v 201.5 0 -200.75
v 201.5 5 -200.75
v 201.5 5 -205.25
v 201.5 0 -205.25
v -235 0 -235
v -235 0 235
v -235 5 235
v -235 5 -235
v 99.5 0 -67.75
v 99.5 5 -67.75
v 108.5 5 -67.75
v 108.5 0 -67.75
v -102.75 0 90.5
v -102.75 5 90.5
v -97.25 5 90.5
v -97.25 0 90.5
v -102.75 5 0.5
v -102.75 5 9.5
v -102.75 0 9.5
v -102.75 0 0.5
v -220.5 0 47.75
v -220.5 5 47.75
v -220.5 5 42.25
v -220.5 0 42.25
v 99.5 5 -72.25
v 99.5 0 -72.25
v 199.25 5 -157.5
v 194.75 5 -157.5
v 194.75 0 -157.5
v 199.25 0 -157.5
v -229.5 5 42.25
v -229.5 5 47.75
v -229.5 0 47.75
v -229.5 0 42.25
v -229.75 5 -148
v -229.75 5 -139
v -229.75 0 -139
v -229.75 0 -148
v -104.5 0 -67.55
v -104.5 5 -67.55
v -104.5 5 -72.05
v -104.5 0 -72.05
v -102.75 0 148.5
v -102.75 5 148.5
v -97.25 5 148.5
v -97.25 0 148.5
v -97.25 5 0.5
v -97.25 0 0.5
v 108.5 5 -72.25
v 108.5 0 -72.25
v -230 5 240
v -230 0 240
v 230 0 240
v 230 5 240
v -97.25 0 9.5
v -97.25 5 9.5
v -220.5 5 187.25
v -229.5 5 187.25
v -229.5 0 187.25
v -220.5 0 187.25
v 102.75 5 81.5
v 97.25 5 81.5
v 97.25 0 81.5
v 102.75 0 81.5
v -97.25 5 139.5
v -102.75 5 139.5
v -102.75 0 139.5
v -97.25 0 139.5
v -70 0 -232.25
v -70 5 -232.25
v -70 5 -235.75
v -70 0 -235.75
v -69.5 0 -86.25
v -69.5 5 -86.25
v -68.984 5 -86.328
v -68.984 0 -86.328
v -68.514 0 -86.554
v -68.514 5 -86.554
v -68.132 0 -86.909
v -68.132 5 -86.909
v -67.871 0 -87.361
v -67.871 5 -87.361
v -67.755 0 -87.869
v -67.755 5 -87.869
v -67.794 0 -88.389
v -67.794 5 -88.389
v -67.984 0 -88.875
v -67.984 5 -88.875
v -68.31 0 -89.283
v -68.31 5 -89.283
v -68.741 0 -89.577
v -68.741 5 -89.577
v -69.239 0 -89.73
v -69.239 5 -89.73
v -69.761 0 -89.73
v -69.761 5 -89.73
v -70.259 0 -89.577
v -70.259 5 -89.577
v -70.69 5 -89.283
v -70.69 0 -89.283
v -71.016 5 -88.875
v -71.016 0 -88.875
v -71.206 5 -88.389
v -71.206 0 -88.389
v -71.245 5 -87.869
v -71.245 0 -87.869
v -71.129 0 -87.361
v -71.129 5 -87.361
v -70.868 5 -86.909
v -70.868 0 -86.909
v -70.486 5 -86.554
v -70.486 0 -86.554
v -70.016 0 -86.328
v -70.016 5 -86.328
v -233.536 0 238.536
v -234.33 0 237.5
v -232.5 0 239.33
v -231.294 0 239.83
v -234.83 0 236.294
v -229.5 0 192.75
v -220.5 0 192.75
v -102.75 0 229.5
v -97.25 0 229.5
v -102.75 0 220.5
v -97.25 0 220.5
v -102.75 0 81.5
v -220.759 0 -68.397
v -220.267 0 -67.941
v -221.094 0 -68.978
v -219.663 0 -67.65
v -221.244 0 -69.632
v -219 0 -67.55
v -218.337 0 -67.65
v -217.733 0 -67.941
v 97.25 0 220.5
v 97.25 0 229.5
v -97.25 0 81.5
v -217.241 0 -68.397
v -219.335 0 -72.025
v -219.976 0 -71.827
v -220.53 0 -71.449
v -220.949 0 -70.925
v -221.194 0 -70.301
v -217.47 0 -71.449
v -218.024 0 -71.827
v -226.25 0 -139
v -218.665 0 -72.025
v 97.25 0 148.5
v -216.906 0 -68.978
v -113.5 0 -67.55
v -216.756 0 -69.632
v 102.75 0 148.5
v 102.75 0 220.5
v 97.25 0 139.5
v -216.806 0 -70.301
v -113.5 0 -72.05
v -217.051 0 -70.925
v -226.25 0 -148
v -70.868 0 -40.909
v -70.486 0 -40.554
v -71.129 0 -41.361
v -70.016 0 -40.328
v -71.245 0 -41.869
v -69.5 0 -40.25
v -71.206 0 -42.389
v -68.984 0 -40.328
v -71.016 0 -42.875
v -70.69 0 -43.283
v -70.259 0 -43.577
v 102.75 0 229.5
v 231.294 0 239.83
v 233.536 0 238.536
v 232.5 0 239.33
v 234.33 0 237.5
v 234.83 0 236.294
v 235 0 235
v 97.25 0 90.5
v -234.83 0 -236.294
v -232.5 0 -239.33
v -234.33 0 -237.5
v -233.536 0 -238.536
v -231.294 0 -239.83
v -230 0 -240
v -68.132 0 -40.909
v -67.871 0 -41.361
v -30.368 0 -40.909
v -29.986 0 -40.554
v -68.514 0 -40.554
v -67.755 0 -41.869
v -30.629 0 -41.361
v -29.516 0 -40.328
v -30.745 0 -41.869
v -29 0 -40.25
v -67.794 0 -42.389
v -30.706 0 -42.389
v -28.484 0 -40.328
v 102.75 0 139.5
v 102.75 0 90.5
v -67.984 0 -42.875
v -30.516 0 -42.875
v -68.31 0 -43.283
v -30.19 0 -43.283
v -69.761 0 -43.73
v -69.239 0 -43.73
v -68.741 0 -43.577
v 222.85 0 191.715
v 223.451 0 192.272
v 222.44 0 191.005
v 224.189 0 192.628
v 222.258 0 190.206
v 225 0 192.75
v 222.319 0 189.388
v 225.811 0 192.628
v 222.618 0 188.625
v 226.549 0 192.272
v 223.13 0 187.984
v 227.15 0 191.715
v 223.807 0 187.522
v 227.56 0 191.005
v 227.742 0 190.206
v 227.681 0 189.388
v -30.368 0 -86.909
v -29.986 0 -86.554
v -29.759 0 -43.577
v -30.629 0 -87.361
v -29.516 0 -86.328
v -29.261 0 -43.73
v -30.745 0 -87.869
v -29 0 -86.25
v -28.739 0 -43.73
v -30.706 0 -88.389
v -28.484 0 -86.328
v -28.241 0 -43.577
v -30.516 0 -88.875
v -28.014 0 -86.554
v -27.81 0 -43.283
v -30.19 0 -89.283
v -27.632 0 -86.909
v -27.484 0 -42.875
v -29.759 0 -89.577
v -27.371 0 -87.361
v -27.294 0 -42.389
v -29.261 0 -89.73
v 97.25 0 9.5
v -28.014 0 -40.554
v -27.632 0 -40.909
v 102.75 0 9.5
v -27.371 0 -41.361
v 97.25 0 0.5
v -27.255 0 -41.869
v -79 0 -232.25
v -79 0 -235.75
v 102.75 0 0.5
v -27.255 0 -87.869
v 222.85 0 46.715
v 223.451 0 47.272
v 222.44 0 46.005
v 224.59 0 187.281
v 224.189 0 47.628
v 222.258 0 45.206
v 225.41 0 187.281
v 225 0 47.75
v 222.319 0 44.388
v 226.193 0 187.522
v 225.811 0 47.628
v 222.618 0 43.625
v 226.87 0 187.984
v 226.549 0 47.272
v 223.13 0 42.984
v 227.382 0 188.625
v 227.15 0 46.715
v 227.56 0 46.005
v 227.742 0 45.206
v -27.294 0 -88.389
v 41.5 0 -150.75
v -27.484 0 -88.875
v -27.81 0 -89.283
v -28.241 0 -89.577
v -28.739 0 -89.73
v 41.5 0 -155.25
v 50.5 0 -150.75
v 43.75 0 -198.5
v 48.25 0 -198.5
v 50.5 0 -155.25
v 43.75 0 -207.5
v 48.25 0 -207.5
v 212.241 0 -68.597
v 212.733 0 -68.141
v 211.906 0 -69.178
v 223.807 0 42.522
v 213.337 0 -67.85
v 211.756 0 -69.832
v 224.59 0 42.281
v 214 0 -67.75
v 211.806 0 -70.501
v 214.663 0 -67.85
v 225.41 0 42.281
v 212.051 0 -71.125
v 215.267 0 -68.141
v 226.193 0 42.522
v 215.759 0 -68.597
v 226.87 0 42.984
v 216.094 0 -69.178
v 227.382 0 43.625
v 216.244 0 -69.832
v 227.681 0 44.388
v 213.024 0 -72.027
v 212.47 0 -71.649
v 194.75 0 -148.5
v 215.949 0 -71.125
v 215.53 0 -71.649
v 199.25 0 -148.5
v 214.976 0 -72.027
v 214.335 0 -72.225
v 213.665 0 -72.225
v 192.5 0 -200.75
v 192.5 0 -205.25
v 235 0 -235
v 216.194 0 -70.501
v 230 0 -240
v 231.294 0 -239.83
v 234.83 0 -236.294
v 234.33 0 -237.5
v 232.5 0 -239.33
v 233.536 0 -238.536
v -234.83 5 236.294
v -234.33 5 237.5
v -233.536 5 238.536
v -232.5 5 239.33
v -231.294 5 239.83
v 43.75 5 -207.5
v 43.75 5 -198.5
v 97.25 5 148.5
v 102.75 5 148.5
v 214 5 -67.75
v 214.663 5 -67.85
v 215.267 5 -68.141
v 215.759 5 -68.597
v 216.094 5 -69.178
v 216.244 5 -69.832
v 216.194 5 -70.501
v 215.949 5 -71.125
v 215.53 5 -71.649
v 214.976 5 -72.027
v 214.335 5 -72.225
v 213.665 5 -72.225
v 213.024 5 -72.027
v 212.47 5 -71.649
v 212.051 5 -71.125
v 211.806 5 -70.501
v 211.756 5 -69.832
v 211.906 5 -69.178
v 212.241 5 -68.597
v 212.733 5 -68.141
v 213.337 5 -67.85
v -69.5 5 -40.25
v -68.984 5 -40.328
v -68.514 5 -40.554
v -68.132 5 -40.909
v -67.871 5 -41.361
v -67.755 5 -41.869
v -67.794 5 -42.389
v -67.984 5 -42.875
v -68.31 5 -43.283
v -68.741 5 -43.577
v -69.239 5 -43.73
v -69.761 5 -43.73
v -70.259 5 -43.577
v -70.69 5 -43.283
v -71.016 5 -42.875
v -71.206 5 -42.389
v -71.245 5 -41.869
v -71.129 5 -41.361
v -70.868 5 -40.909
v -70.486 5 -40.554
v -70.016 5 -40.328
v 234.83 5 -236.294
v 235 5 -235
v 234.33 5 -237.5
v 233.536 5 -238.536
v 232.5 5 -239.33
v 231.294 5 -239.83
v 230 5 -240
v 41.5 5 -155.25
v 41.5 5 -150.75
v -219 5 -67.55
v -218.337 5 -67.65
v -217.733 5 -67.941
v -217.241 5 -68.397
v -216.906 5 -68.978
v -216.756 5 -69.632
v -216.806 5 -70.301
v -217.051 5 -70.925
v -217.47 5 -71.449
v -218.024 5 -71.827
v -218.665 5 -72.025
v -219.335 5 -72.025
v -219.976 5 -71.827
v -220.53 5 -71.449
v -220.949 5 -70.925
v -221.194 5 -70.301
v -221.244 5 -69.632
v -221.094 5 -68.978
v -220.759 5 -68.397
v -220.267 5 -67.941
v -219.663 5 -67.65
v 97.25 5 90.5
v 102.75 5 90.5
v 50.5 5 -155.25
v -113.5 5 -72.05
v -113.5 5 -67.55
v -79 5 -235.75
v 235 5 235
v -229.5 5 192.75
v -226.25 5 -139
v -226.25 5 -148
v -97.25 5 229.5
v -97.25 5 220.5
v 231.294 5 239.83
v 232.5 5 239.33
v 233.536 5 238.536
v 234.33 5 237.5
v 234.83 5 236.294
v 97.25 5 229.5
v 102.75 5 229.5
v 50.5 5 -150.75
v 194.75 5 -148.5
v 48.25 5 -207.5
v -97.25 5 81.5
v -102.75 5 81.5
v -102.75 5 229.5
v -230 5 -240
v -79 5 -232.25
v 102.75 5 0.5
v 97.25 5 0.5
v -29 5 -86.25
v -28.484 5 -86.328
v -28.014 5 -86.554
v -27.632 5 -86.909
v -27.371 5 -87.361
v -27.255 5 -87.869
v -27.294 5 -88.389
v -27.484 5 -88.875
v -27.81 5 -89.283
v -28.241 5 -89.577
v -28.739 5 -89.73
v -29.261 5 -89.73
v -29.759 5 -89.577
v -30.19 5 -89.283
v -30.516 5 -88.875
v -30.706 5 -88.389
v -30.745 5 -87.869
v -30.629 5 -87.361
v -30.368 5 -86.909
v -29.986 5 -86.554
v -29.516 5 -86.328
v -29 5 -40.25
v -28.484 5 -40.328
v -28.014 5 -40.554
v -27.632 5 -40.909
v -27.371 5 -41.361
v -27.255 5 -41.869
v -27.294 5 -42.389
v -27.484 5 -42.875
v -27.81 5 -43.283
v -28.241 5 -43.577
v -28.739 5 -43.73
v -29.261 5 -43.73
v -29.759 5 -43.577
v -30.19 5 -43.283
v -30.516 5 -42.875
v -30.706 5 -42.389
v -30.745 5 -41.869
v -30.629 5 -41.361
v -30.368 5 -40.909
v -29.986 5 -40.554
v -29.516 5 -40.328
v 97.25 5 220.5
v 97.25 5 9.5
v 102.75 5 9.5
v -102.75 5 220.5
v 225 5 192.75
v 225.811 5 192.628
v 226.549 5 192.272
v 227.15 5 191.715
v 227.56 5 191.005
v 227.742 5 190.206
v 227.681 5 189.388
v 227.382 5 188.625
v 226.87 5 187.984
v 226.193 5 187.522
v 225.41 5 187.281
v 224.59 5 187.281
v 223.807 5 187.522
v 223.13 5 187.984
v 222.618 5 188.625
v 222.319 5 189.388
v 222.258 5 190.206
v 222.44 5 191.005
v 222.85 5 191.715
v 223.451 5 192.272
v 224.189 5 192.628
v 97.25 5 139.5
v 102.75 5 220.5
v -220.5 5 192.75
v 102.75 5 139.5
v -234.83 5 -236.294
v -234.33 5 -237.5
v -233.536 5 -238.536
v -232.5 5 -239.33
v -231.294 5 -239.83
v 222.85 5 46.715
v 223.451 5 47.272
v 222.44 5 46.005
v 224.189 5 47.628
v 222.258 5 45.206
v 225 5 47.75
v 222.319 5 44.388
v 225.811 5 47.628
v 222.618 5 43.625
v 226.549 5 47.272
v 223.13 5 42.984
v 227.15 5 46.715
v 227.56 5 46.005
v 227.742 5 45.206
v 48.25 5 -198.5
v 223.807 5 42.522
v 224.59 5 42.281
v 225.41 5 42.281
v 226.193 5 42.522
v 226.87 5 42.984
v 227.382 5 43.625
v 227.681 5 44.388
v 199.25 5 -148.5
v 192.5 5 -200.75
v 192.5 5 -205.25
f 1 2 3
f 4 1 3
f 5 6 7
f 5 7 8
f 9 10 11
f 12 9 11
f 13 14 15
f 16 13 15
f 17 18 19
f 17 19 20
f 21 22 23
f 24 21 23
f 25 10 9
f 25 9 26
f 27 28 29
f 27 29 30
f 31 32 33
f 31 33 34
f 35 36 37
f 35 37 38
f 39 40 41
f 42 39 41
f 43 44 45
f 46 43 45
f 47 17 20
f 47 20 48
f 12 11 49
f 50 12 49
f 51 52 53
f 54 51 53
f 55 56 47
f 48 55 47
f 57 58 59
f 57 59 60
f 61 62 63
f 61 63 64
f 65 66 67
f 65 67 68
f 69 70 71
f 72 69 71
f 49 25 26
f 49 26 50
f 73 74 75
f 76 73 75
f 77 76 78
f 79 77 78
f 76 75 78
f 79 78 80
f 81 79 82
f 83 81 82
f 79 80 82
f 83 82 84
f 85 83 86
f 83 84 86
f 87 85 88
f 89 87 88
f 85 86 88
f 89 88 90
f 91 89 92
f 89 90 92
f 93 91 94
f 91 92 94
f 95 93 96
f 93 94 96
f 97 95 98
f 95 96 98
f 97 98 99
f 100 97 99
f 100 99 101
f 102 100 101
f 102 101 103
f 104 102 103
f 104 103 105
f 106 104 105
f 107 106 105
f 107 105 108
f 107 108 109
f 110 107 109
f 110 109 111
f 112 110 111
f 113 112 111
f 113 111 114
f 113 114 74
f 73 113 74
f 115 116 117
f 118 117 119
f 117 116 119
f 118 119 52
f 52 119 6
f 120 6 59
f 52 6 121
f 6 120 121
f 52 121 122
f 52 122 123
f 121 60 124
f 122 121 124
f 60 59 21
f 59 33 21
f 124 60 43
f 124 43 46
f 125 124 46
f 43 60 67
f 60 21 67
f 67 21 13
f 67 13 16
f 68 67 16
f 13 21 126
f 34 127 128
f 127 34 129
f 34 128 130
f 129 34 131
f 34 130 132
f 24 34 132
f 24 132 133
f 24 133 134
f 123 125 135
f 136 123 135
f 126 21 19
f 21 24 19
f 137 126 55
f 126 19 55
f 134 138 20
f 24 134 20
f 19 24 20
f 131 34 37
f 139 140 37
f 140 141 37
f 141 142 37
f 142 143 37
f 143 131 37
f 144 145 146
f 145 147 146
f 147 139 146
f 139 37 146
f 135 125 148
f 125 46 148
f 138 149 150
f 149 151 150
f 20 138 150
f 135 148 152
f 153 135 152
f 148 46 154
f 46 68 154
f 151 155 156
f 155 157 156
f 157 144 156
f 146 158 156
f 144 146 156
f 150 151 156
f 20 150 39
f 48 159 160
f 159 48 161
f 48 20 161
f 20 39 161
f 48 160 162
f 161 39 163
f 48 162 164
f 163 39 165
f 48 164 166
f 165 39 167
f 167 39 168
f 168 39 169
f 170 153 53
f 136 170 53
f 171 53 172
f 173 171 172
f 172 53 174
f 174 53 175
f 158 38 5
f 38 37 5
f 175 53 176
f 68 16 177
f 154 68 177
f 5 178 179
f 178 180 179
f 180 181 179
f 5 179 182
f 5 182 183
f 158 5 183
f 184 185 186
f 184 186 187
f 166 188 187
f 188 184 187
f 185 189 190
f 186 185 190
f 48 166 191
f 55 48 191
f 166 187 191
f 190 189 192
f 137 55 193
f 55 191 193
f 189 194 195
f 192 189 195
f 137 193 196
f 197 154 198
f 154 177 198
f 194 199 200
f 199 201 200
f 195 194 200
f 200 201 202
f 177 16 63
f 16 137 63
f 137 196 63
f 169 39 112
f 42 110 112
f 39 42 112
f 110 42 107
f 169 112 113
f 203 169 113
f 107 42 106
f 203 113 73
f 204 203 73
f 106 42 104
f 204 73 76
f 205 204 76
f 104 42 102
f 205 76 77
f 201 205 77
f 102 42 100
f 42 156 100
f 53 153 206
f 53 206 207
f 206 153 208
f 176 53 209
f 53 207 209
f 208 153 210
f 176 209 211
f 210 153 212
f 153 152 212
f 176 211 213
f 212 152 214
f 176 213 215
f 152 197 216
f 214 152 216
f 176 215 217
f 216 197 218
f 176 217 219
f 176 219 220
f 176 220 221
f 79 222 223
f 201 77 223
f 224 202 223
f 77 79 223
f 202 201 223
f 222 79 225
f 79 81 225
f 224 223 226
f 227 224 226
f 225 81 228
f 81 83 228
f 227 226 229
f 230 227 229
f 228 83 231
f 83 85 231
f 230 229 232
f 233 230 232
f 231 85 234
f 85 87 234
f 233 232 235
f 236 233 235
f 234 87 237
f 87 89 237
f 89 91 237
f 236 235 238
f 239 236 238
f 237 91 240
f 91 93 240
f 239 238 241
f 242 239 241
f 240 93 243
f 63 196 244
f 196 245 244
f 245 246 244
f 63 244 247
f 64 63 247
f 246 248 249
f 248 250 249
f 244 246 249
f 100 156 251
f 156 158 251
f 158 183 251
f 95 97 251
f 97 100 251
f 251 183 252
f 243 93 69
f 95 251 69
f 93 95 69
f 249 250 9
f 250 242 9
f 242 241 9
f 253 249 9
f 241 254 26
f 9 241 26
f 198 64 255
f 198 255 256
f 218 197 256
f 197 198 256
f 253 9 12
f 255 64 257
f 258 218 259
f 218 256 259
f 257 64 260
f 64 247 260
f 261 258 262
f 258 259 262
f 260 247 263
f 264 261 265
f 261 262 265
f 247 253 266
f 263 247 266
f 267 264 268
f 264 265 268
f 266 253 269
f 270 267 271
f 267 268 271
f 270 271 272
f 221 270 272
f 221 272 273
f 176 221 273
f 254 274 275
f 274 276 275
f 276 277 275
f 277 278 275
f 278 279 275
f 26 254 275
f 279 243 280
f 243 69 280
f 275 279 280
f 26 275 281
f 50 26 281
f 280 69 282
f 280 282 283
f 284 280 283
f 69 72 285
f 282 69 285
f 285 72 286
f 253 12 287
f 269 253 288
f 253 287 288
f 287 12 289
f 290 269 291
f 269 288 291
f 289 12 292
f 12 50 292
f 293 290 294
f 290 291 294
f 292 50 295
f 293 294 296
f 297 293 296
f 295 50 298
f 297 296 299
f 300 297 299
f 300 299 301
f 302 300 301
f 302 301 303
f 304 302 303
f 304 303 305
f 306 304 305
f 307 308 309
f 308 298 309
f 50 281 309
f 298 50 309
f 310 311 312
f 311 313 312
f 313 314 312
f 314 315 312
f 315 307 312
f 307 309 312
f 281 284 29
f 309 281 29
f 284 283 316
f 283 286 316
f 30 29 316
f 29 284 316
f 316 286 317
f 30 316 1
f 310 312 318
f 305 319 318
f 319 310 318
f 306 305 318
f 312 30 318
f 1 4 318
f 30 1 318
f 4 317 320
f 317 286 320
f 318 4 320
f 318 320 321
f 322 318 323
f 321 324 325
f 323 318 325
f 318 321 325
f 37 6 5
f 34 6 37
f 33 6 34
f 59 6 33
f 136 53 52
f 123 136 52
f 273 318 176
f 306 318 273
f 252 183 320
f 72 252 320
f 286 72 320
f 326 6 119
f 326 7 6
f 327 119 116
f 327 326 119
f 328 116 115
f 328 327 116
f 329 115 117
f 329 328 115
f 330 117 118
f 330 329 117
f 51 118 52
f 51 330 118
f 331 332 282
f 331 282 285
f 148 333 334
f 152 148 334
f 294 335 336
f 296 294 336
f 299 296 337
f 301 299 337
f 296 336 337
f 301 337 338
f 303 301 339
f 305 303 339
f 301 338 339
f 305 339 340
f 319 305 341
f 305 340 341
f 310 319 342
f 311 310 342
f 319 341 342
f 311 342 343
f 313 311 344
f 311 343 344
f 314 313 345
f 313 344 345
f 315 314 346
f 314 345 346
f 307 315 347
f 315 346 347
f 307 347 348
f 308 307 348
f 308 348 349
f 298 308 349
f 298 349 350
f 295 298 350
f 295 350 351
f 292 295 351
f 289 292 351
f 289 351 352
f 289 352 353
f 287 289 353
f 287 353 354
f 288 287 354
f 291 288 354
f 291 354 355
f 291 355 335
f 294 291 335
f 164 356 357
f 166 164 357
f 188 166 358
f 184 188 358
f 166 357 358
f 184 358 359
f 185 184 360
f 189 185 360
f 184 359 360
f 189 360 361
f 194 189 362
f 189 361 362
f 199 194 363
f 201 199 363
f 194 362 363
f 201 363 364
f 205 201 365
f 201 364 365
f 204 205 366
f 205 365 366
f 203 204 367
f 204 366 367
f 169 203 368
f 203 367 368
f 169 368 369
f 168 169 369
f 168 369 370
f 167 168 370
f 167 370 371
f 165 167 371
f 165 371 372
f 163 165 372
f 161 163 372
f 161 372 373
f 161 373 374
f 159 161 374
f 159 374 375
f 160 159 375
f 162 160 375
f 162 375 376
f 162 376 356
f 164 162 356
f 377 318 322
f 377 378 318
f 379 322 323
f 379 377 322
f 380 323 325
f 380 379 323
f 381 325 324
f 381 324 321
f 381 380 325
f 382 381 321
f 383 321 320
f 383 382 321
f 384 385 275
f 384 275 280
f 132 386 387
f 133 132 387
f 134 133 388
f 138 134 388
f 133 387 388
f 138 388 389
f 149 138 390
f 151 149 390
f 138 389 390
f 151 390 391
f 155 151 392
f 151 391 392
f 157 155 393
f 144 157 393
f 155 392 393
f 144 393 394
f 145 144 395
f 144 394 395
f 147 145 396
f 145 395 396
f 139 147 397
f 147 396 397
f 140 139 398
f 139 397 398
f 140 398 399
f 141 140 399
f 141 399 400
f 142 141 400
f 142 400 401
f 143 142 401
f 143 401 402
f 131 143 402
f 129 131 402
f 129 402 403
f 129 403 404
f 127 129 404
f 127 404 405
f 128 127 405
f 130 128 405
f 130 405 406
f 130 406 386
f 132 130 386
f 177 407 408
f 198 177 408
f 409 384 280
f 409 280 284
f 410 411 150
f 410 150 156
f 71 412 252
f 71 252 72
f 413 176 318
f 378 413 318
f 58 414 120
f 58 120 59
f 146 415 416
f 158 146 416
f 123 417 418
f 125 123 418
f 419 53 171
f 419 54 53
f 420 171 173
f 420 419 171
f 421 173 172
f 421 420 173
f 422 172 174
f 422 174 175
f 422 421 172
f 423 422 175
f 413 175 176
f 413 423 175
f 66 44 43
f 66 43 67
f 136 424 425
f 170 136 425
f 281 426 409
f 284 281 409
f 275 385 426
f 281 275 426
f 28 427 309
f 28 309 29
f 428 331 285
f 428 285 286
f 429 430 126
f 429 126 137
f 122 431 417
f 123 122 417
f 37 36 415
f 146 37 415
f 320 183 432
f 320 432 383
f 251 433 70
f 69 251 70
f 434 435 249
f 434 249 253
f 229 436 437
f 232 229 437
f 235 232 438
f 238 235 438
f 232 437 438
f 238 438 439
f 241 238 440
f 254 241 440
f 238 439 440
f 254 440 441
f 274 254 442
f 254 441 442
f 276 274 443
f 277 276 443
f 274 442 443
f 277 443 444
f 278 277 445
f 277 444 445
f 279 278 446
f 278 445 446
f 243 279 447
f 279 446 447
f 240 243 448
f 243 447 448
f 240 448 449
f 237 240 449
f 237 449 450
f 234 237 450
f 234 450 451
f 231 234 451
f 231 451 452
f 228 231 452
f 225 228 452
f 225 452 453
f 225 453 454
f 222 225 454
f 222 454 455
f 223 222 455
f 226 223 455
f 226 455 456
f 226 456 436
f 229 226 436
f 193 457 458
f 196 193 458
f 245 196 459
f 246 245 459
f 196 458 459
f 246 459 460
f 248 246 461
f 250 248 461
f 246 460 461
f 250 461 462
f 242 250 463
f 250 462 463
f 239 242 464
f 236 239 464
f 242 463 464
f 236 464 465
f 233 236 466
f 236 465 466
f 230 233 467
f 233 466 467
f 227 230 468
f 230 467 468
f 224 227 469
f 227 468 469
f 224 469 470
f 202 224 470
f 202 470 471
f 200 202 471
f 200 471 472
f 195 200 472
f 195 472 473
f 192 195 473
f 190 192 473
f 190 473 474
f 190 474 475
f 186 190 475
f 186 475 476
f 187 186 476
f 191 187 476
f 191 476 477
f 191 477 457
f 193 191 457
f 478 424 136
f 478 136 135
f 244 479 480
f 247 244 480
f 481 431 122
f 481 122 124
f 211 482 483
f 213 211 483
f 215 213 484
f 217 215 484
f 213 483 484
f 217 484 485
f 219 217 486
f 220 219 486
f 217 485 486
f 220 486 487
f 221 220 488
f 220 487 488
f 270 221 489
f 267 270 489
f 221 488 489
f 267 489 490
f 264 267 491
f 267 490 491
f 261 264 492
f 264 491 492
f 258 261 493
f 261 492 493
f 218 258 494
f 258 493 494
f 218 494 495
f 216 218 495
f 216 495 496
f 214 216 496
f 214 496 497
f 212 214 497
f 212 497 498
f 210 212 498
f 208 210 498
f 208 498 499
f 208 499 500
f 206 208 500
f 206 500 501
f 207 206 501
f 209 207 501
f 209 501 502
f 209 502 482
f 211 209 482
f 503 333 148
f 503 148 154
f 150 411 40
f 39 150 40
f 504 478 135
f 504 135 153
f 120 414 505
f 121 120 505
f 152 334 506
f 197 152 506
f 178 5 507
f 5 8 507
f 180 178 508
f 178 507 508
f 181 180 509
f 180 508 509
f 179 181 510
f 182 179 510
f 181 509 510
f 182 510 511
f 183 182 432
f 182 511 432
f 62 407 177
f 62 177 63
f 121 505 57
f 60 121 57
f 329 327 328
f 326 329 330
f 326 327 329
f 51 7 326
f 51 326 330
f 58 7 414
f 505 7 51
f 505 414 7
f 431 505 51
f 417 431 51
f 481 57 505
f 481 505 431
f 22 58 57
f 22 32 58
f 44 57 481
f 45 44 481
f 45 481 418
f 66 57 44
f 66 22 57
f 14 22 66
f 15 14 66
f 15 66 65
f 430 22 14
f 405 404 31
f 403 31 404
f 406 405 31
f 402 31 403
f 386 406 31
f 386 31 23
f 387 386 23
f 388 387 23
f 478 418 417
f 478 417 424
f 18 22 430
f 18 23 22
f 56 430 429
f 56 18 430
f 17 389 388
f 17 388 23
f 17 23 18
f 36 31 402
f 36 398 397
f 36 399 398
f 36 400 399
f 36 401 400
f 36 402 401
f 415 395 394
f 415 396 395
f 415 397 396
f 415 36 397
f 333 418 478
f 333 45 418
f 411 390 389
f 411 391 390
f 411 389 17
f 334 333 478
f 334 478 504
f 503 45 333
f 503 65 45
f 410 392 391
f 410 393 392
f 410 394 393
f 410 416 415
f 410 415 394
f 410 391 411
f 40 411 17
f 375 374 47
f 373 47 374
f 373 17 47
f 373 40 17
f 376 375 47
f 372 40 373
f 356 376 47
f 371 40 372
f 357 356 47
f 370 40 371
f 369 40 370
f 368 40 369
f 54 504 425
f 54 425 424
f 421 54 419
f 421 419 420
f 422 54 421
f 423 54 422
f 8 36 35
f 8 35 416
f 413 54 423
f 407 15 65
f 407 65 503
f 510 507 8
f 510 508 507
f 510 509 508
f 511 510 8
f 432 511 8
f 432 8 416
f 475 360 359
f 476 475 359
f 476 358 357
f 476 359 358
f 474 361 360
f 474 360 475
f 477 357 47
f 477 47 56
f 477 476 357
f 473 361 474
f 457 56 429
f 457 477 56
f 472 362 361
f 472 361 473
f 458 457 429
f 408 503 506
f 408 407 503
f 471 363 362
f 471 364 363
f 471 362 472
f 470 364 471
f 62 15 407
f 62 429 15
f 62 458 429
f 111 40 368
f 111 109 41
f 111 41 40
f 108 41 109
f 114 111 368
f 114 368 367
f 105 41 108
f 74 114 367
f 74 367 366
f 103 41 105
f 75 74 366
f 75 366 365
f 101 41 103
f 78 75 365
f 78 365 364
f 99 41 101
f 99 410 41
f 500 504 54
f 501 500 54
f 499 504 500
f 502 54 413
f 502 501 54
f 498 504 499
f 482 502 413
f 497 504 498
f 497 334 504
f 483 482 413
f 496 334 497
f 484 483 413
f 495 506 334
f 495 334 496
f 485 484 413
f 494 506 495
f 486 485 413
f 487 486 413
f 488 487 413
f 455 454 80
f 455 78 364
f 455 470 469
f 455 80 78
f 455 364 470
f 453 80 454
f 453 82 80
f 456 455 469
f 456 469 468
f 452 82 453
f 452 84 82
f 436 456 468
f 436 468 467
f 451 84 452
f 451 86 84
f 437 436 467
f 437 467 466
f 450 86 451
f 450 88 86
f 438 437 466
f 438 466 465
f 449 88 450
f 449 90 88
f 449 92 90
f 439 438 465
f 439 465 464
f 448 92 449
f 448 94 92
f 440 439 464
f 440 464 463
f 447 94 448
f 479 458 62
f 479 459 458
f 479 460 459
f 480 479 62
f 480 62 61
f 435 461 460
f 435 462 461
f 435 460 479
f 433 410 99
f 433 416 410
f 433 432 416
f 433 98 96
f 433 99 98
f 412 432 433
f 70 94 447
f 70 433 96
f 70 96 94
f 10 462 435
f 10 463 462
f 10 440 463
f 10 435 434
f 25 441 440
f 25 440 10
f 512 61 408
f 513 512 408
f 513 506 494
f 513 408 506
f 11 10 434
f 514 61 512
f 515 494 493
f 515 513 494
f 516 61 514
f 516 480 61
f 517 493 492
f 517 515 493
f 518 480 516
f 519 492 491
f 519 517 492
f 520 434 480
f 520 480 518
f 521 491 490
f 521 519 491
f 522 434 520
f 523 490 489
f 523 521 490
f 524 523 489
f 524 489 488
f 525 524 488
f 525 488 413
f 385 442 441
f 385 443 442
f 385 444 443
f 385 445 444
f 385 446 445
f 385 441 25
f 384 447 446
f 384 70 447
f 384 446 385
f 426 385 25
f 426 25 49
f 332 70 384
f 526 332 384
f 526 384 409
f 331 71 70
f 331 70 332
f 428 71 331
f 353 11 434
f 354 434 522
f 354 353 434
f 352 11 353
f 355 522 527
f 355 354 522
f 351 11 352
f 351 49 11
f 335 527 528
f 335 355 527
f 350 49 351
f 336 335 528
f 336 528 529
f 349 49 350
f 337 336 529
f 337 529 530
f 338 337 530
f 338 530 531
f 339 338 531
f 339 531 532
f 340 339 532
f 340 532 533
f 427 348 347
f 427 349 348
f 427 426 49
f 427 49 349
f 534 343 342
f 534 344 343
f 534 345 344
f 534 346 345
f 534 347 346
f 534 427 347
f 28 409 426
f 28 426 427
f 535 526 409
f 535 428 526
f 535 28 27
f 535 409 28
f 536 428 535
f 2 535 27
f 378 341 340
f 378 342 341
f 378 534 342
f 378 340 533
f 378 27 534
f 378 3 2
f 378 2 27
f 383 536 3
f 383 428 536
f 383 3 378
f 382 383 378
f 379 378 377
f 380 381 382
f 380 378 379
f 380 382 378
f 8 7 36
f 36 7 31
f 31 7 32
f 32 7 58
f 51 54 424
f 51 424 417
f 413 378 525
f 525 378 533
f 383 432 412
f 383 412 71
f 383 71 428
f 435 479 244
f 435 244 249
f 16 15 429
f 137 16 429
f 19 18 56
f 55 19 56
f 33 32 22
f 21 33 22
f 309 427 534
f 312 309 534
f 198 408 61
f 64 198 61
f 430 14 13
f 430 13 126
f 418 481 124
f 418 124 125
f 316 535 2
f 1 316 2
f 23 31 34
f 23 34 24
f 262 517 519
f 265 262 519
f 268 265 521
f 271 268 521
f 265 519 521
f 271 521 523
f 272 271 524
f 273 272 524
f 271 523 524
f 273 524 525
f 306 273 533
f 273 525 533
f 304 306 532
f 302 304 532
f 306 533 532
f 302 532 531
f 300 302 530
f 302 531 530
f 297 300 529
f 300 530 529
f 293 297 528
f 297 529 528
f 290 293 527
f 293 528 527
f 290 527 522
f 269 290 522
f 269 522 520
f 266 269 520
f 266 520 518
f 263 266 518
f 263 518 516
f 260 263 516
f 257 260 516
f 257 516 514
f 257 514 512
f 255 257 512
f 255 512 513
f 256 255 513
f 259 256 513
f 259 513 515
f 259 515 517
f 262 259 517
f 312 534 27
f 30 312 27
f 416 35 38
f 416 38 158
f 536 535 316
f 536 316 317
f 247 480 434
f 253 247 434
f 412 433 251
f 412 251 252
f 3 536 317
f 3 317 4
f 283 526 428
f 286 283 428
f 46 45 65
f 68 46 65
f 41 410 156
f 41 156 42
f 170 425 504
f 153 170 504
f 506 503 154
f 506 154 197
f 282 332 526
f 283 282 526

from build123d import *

# Parameters (mm, degrees)
SKETCH_1_W          = 470
SKETCH_1_H          = 480
EXTRUDE_1_DEPTH     = 5
FILLET_1_R          = 5
SKETCH_2_R          = 2.25
SKETCH_2_R_2        = 1.75
SKETCH_2_R_3        = 2.75
CUT_EXTRUDE_1_DEPTH = 336.931540645
SKETCH_3_W          = 9
SKETCH_3_H          = 4.5
SKETCH_3_W_2        = 4.5
SKETCH_3_H_2        = 9
SKETCH_3_H_3        = 3.5
SKETCH_3_W_3        = 3.5
SKETCH_3_W_4        = 5.5
SKETCH_3_H_4        = 5.5
CUT_EXTRUDE_2_DEPTH = 336.931540645


with BuildPart() as part:
    # 草图1 → 凸台-拉伸1 (new body)
    with BuildSketch(Plane(origin=(0, 0, 0), x_dir=(1, 0, 0), z_dir=(0, 1, 0))):
        Rectangle(SKETCH_1_W, SKETCH_1_H)
    extrude(amount=EXTRUDE_1_DEPTH)

    # 圆角1
    fillet_1_edges = [part.edges().sort_by_distance(p)[0] for p in [
        (235, 2.5, 240),
        (-235, 2.5, 240),
        (-235, 2.5, -240),
        (235, 2.5, -240),
    ]]
    fillet(fillet_1_edges, radius=FILLET_1_R)

    # 草图2 → 切除-拉伸1 (cut, through all)
    with BuildSketch(Plane(origin=(0, 5, 0), x_dir=(1, 0, 0), z_dir=(0, 1, 0))):
        with Locations(Location((197, 153, 0), (0, 0, 270))):
            Circle(SKETCH_2_R)
        with Locations(Location((46, 153, 0), (0, 0, 270))):
            Circle(SKETCH_2_R)
        with Locations(Location((197, 203, 0), (0, 0, 270))):
            Circle(SKETCH_2_R)
        with Locations(Location((46, 203, 0), (0, 0, 270))):
            Circle(SKETCH_2_R)
        with Locations(Location((-228, 143.5, 0), (0, 0, 270))):
            Circle(SKETCH_2_R_2)
        with Locations(Location((-74.5, 234, 0), (0, 0, 270))):
            Circle(SKETCH_2_R_2)
        with Locations(Location((-219, 69.8, 0), (0, 0, 270))):
            Circle(SKETCH_2_R)
        with Locations(Location((-109, 69.8, 0), (0, 0, 270))):
            Circle(SKETCH_2_R)
        with Locations(Location((-69.5, 42, 0), (0, 0, 270))):
            Circle(SKETCH_2_R_2)
        with Locations(Location((-69.5, 88, 0), (0, 0, 270))):
            Circle(SKETCH_2_R_2)
        with Locations(Location((-29, 42, 0), (0, 0, 270))):
            Circle(SKETCH_2_R_2)
        with Locations(Location((-29, 88, 0), (0, 0, 270))):
            Circle(SKETCH_2_R_2)
        with Locations(Location((214, 70, 0), (0, 0, 270))):
            Circle(SKETCH_2_R)
        with Locations(Location((104, 70, 0), (0, 0, 270))):
            Circle(SKETCH_2_R)
        with Locations(Location((225, -190, 0), (0, 0, 270))):
            Circle(SKETCH_2_R_3)
        with Locations(Location((225, -45, 0), (0, 0, 270))):
            Circle(SKETCH_2_R_3)
        with Locations(Location((100, -5, 0), (0, 0, 270))):
            Circle(SKETCH_2_R_3)
        with Locations(Location((100, -225, 0), (0, 0, 270))):
            Circle(SKETCH_2_R_3)
        with Locations(Location((100, -144, 0), (0, 0, 270))):
            Circle(SKETCH_2_R_3)
        with Locations(Location((100, -86, 0), (0, 0, 270))):
            Circle(SKETCH_2_R_3)
        with Locations(Location((-100, -5, 0), (0, 0, 90))):
            Circle(SKETCH_2_R_3)
        with Locations(Location((-100, -86, 0), (0, 0, 90))):
            Circle(SKETCH_2_R_3)
        with Locations(Location((-100, -144, 0), (0, 0, 90))):
            Circle(SKETCH_2_R_3)
        with Locations(Location((-100, -225, 0), (0, 0, 90))):
            Circle(SKETCH_2_R_3)
        with Locations(Location((-225, -45, 0), (0, 0, 90))):
            Circle(SKETCH_2_R_3)
        with Locations(Location((-225, -190, 0), (0, 0, 90))):
            Circle(SKETCH_2_R_3)
    extrude(amount=-CUT_EXTRUDE_1_DEPTH, mode=Mode.SUBTRACT)

    # 草图3 → 切除-拉伸2 (cut, through all)
    with BuildSketch(Plane(origin=(0, 5, 0), x_dir=(1, 0, 0), z_dir=(0, 1, 0))):
        with Locations((104, 70)):
            Rectangle(SKETCH_3_W, SKETCH_3_H)
        with Locations((-109, 69.8)):
            Rectangle(SKETCH_3_W, SKETCH_3_H)
        with Locations((197, 153)):
            Rectangle(SKETCH_3_W_2, SKETCH_3_H_2)
        with Locations((-74.5, 234)):
            Rectangle(SKETCH_3_W, SKETCH_3_H_3)
        with Locations((-228, 143.5)):
            Rectangle(SKETCH_3_W_3, SKETCH_3_H_2)
        with Locations((197, 203)):
            Rectangle(SKETCH_3_W, SKETCH_3_H)
        with Locations((46, 203)):
            Rectangle(SKETCH_3_W_2, SKETCH_3_H_2)
        with Locations((46, 153)):
            Rectangle(SKETCH_3_W, SKETCH_3_H)
        with Locations((100, -225)):
            Rectangle(SKETCH_3_W_4, SKETCH_3_H_2)
        with Locations((100, -144)):
            Rectangle(SKETCH_3_W_4, SKETCH_3_H_2)
        with Locations((100, -86)):
            Rectangle(SKETCH_3_W_4, SKETCH_3_H_2)
        with Locations((100, -5)):
            Rectangle(SKETCH_3_W_4, SKETCH_3_H_2)
        with Locations((-225, -190)):
            Rectangle(SKETCH_3_W, SKETCH_3_H_4)
        with Locations((-225, -45)):
            Rectangle(SKETCH_3_W, SKETCH_3_H_4)
        with Locations((-100, -5)):
            Rectangle(SKETCH_3_W_4, SKETCH_3_H_2)
        with Locations((-100, -86)):
            Rectangle(SKETCH_3_W_4, SKETCH_3_H_2)
        with Locations((-100, -144)):
            Rectangle(SKETCH_3_W_4, SKETCH_3_H_2)
        with Locations((-100, -225)):
            Rectangle(SKETCH_3_W_4, SKETCH_3_H_2)
    extrude(amount=-CUT_EXTRUDE_2_DEPTH, mode=Mode.SUBTRACT)


solid = part.part
